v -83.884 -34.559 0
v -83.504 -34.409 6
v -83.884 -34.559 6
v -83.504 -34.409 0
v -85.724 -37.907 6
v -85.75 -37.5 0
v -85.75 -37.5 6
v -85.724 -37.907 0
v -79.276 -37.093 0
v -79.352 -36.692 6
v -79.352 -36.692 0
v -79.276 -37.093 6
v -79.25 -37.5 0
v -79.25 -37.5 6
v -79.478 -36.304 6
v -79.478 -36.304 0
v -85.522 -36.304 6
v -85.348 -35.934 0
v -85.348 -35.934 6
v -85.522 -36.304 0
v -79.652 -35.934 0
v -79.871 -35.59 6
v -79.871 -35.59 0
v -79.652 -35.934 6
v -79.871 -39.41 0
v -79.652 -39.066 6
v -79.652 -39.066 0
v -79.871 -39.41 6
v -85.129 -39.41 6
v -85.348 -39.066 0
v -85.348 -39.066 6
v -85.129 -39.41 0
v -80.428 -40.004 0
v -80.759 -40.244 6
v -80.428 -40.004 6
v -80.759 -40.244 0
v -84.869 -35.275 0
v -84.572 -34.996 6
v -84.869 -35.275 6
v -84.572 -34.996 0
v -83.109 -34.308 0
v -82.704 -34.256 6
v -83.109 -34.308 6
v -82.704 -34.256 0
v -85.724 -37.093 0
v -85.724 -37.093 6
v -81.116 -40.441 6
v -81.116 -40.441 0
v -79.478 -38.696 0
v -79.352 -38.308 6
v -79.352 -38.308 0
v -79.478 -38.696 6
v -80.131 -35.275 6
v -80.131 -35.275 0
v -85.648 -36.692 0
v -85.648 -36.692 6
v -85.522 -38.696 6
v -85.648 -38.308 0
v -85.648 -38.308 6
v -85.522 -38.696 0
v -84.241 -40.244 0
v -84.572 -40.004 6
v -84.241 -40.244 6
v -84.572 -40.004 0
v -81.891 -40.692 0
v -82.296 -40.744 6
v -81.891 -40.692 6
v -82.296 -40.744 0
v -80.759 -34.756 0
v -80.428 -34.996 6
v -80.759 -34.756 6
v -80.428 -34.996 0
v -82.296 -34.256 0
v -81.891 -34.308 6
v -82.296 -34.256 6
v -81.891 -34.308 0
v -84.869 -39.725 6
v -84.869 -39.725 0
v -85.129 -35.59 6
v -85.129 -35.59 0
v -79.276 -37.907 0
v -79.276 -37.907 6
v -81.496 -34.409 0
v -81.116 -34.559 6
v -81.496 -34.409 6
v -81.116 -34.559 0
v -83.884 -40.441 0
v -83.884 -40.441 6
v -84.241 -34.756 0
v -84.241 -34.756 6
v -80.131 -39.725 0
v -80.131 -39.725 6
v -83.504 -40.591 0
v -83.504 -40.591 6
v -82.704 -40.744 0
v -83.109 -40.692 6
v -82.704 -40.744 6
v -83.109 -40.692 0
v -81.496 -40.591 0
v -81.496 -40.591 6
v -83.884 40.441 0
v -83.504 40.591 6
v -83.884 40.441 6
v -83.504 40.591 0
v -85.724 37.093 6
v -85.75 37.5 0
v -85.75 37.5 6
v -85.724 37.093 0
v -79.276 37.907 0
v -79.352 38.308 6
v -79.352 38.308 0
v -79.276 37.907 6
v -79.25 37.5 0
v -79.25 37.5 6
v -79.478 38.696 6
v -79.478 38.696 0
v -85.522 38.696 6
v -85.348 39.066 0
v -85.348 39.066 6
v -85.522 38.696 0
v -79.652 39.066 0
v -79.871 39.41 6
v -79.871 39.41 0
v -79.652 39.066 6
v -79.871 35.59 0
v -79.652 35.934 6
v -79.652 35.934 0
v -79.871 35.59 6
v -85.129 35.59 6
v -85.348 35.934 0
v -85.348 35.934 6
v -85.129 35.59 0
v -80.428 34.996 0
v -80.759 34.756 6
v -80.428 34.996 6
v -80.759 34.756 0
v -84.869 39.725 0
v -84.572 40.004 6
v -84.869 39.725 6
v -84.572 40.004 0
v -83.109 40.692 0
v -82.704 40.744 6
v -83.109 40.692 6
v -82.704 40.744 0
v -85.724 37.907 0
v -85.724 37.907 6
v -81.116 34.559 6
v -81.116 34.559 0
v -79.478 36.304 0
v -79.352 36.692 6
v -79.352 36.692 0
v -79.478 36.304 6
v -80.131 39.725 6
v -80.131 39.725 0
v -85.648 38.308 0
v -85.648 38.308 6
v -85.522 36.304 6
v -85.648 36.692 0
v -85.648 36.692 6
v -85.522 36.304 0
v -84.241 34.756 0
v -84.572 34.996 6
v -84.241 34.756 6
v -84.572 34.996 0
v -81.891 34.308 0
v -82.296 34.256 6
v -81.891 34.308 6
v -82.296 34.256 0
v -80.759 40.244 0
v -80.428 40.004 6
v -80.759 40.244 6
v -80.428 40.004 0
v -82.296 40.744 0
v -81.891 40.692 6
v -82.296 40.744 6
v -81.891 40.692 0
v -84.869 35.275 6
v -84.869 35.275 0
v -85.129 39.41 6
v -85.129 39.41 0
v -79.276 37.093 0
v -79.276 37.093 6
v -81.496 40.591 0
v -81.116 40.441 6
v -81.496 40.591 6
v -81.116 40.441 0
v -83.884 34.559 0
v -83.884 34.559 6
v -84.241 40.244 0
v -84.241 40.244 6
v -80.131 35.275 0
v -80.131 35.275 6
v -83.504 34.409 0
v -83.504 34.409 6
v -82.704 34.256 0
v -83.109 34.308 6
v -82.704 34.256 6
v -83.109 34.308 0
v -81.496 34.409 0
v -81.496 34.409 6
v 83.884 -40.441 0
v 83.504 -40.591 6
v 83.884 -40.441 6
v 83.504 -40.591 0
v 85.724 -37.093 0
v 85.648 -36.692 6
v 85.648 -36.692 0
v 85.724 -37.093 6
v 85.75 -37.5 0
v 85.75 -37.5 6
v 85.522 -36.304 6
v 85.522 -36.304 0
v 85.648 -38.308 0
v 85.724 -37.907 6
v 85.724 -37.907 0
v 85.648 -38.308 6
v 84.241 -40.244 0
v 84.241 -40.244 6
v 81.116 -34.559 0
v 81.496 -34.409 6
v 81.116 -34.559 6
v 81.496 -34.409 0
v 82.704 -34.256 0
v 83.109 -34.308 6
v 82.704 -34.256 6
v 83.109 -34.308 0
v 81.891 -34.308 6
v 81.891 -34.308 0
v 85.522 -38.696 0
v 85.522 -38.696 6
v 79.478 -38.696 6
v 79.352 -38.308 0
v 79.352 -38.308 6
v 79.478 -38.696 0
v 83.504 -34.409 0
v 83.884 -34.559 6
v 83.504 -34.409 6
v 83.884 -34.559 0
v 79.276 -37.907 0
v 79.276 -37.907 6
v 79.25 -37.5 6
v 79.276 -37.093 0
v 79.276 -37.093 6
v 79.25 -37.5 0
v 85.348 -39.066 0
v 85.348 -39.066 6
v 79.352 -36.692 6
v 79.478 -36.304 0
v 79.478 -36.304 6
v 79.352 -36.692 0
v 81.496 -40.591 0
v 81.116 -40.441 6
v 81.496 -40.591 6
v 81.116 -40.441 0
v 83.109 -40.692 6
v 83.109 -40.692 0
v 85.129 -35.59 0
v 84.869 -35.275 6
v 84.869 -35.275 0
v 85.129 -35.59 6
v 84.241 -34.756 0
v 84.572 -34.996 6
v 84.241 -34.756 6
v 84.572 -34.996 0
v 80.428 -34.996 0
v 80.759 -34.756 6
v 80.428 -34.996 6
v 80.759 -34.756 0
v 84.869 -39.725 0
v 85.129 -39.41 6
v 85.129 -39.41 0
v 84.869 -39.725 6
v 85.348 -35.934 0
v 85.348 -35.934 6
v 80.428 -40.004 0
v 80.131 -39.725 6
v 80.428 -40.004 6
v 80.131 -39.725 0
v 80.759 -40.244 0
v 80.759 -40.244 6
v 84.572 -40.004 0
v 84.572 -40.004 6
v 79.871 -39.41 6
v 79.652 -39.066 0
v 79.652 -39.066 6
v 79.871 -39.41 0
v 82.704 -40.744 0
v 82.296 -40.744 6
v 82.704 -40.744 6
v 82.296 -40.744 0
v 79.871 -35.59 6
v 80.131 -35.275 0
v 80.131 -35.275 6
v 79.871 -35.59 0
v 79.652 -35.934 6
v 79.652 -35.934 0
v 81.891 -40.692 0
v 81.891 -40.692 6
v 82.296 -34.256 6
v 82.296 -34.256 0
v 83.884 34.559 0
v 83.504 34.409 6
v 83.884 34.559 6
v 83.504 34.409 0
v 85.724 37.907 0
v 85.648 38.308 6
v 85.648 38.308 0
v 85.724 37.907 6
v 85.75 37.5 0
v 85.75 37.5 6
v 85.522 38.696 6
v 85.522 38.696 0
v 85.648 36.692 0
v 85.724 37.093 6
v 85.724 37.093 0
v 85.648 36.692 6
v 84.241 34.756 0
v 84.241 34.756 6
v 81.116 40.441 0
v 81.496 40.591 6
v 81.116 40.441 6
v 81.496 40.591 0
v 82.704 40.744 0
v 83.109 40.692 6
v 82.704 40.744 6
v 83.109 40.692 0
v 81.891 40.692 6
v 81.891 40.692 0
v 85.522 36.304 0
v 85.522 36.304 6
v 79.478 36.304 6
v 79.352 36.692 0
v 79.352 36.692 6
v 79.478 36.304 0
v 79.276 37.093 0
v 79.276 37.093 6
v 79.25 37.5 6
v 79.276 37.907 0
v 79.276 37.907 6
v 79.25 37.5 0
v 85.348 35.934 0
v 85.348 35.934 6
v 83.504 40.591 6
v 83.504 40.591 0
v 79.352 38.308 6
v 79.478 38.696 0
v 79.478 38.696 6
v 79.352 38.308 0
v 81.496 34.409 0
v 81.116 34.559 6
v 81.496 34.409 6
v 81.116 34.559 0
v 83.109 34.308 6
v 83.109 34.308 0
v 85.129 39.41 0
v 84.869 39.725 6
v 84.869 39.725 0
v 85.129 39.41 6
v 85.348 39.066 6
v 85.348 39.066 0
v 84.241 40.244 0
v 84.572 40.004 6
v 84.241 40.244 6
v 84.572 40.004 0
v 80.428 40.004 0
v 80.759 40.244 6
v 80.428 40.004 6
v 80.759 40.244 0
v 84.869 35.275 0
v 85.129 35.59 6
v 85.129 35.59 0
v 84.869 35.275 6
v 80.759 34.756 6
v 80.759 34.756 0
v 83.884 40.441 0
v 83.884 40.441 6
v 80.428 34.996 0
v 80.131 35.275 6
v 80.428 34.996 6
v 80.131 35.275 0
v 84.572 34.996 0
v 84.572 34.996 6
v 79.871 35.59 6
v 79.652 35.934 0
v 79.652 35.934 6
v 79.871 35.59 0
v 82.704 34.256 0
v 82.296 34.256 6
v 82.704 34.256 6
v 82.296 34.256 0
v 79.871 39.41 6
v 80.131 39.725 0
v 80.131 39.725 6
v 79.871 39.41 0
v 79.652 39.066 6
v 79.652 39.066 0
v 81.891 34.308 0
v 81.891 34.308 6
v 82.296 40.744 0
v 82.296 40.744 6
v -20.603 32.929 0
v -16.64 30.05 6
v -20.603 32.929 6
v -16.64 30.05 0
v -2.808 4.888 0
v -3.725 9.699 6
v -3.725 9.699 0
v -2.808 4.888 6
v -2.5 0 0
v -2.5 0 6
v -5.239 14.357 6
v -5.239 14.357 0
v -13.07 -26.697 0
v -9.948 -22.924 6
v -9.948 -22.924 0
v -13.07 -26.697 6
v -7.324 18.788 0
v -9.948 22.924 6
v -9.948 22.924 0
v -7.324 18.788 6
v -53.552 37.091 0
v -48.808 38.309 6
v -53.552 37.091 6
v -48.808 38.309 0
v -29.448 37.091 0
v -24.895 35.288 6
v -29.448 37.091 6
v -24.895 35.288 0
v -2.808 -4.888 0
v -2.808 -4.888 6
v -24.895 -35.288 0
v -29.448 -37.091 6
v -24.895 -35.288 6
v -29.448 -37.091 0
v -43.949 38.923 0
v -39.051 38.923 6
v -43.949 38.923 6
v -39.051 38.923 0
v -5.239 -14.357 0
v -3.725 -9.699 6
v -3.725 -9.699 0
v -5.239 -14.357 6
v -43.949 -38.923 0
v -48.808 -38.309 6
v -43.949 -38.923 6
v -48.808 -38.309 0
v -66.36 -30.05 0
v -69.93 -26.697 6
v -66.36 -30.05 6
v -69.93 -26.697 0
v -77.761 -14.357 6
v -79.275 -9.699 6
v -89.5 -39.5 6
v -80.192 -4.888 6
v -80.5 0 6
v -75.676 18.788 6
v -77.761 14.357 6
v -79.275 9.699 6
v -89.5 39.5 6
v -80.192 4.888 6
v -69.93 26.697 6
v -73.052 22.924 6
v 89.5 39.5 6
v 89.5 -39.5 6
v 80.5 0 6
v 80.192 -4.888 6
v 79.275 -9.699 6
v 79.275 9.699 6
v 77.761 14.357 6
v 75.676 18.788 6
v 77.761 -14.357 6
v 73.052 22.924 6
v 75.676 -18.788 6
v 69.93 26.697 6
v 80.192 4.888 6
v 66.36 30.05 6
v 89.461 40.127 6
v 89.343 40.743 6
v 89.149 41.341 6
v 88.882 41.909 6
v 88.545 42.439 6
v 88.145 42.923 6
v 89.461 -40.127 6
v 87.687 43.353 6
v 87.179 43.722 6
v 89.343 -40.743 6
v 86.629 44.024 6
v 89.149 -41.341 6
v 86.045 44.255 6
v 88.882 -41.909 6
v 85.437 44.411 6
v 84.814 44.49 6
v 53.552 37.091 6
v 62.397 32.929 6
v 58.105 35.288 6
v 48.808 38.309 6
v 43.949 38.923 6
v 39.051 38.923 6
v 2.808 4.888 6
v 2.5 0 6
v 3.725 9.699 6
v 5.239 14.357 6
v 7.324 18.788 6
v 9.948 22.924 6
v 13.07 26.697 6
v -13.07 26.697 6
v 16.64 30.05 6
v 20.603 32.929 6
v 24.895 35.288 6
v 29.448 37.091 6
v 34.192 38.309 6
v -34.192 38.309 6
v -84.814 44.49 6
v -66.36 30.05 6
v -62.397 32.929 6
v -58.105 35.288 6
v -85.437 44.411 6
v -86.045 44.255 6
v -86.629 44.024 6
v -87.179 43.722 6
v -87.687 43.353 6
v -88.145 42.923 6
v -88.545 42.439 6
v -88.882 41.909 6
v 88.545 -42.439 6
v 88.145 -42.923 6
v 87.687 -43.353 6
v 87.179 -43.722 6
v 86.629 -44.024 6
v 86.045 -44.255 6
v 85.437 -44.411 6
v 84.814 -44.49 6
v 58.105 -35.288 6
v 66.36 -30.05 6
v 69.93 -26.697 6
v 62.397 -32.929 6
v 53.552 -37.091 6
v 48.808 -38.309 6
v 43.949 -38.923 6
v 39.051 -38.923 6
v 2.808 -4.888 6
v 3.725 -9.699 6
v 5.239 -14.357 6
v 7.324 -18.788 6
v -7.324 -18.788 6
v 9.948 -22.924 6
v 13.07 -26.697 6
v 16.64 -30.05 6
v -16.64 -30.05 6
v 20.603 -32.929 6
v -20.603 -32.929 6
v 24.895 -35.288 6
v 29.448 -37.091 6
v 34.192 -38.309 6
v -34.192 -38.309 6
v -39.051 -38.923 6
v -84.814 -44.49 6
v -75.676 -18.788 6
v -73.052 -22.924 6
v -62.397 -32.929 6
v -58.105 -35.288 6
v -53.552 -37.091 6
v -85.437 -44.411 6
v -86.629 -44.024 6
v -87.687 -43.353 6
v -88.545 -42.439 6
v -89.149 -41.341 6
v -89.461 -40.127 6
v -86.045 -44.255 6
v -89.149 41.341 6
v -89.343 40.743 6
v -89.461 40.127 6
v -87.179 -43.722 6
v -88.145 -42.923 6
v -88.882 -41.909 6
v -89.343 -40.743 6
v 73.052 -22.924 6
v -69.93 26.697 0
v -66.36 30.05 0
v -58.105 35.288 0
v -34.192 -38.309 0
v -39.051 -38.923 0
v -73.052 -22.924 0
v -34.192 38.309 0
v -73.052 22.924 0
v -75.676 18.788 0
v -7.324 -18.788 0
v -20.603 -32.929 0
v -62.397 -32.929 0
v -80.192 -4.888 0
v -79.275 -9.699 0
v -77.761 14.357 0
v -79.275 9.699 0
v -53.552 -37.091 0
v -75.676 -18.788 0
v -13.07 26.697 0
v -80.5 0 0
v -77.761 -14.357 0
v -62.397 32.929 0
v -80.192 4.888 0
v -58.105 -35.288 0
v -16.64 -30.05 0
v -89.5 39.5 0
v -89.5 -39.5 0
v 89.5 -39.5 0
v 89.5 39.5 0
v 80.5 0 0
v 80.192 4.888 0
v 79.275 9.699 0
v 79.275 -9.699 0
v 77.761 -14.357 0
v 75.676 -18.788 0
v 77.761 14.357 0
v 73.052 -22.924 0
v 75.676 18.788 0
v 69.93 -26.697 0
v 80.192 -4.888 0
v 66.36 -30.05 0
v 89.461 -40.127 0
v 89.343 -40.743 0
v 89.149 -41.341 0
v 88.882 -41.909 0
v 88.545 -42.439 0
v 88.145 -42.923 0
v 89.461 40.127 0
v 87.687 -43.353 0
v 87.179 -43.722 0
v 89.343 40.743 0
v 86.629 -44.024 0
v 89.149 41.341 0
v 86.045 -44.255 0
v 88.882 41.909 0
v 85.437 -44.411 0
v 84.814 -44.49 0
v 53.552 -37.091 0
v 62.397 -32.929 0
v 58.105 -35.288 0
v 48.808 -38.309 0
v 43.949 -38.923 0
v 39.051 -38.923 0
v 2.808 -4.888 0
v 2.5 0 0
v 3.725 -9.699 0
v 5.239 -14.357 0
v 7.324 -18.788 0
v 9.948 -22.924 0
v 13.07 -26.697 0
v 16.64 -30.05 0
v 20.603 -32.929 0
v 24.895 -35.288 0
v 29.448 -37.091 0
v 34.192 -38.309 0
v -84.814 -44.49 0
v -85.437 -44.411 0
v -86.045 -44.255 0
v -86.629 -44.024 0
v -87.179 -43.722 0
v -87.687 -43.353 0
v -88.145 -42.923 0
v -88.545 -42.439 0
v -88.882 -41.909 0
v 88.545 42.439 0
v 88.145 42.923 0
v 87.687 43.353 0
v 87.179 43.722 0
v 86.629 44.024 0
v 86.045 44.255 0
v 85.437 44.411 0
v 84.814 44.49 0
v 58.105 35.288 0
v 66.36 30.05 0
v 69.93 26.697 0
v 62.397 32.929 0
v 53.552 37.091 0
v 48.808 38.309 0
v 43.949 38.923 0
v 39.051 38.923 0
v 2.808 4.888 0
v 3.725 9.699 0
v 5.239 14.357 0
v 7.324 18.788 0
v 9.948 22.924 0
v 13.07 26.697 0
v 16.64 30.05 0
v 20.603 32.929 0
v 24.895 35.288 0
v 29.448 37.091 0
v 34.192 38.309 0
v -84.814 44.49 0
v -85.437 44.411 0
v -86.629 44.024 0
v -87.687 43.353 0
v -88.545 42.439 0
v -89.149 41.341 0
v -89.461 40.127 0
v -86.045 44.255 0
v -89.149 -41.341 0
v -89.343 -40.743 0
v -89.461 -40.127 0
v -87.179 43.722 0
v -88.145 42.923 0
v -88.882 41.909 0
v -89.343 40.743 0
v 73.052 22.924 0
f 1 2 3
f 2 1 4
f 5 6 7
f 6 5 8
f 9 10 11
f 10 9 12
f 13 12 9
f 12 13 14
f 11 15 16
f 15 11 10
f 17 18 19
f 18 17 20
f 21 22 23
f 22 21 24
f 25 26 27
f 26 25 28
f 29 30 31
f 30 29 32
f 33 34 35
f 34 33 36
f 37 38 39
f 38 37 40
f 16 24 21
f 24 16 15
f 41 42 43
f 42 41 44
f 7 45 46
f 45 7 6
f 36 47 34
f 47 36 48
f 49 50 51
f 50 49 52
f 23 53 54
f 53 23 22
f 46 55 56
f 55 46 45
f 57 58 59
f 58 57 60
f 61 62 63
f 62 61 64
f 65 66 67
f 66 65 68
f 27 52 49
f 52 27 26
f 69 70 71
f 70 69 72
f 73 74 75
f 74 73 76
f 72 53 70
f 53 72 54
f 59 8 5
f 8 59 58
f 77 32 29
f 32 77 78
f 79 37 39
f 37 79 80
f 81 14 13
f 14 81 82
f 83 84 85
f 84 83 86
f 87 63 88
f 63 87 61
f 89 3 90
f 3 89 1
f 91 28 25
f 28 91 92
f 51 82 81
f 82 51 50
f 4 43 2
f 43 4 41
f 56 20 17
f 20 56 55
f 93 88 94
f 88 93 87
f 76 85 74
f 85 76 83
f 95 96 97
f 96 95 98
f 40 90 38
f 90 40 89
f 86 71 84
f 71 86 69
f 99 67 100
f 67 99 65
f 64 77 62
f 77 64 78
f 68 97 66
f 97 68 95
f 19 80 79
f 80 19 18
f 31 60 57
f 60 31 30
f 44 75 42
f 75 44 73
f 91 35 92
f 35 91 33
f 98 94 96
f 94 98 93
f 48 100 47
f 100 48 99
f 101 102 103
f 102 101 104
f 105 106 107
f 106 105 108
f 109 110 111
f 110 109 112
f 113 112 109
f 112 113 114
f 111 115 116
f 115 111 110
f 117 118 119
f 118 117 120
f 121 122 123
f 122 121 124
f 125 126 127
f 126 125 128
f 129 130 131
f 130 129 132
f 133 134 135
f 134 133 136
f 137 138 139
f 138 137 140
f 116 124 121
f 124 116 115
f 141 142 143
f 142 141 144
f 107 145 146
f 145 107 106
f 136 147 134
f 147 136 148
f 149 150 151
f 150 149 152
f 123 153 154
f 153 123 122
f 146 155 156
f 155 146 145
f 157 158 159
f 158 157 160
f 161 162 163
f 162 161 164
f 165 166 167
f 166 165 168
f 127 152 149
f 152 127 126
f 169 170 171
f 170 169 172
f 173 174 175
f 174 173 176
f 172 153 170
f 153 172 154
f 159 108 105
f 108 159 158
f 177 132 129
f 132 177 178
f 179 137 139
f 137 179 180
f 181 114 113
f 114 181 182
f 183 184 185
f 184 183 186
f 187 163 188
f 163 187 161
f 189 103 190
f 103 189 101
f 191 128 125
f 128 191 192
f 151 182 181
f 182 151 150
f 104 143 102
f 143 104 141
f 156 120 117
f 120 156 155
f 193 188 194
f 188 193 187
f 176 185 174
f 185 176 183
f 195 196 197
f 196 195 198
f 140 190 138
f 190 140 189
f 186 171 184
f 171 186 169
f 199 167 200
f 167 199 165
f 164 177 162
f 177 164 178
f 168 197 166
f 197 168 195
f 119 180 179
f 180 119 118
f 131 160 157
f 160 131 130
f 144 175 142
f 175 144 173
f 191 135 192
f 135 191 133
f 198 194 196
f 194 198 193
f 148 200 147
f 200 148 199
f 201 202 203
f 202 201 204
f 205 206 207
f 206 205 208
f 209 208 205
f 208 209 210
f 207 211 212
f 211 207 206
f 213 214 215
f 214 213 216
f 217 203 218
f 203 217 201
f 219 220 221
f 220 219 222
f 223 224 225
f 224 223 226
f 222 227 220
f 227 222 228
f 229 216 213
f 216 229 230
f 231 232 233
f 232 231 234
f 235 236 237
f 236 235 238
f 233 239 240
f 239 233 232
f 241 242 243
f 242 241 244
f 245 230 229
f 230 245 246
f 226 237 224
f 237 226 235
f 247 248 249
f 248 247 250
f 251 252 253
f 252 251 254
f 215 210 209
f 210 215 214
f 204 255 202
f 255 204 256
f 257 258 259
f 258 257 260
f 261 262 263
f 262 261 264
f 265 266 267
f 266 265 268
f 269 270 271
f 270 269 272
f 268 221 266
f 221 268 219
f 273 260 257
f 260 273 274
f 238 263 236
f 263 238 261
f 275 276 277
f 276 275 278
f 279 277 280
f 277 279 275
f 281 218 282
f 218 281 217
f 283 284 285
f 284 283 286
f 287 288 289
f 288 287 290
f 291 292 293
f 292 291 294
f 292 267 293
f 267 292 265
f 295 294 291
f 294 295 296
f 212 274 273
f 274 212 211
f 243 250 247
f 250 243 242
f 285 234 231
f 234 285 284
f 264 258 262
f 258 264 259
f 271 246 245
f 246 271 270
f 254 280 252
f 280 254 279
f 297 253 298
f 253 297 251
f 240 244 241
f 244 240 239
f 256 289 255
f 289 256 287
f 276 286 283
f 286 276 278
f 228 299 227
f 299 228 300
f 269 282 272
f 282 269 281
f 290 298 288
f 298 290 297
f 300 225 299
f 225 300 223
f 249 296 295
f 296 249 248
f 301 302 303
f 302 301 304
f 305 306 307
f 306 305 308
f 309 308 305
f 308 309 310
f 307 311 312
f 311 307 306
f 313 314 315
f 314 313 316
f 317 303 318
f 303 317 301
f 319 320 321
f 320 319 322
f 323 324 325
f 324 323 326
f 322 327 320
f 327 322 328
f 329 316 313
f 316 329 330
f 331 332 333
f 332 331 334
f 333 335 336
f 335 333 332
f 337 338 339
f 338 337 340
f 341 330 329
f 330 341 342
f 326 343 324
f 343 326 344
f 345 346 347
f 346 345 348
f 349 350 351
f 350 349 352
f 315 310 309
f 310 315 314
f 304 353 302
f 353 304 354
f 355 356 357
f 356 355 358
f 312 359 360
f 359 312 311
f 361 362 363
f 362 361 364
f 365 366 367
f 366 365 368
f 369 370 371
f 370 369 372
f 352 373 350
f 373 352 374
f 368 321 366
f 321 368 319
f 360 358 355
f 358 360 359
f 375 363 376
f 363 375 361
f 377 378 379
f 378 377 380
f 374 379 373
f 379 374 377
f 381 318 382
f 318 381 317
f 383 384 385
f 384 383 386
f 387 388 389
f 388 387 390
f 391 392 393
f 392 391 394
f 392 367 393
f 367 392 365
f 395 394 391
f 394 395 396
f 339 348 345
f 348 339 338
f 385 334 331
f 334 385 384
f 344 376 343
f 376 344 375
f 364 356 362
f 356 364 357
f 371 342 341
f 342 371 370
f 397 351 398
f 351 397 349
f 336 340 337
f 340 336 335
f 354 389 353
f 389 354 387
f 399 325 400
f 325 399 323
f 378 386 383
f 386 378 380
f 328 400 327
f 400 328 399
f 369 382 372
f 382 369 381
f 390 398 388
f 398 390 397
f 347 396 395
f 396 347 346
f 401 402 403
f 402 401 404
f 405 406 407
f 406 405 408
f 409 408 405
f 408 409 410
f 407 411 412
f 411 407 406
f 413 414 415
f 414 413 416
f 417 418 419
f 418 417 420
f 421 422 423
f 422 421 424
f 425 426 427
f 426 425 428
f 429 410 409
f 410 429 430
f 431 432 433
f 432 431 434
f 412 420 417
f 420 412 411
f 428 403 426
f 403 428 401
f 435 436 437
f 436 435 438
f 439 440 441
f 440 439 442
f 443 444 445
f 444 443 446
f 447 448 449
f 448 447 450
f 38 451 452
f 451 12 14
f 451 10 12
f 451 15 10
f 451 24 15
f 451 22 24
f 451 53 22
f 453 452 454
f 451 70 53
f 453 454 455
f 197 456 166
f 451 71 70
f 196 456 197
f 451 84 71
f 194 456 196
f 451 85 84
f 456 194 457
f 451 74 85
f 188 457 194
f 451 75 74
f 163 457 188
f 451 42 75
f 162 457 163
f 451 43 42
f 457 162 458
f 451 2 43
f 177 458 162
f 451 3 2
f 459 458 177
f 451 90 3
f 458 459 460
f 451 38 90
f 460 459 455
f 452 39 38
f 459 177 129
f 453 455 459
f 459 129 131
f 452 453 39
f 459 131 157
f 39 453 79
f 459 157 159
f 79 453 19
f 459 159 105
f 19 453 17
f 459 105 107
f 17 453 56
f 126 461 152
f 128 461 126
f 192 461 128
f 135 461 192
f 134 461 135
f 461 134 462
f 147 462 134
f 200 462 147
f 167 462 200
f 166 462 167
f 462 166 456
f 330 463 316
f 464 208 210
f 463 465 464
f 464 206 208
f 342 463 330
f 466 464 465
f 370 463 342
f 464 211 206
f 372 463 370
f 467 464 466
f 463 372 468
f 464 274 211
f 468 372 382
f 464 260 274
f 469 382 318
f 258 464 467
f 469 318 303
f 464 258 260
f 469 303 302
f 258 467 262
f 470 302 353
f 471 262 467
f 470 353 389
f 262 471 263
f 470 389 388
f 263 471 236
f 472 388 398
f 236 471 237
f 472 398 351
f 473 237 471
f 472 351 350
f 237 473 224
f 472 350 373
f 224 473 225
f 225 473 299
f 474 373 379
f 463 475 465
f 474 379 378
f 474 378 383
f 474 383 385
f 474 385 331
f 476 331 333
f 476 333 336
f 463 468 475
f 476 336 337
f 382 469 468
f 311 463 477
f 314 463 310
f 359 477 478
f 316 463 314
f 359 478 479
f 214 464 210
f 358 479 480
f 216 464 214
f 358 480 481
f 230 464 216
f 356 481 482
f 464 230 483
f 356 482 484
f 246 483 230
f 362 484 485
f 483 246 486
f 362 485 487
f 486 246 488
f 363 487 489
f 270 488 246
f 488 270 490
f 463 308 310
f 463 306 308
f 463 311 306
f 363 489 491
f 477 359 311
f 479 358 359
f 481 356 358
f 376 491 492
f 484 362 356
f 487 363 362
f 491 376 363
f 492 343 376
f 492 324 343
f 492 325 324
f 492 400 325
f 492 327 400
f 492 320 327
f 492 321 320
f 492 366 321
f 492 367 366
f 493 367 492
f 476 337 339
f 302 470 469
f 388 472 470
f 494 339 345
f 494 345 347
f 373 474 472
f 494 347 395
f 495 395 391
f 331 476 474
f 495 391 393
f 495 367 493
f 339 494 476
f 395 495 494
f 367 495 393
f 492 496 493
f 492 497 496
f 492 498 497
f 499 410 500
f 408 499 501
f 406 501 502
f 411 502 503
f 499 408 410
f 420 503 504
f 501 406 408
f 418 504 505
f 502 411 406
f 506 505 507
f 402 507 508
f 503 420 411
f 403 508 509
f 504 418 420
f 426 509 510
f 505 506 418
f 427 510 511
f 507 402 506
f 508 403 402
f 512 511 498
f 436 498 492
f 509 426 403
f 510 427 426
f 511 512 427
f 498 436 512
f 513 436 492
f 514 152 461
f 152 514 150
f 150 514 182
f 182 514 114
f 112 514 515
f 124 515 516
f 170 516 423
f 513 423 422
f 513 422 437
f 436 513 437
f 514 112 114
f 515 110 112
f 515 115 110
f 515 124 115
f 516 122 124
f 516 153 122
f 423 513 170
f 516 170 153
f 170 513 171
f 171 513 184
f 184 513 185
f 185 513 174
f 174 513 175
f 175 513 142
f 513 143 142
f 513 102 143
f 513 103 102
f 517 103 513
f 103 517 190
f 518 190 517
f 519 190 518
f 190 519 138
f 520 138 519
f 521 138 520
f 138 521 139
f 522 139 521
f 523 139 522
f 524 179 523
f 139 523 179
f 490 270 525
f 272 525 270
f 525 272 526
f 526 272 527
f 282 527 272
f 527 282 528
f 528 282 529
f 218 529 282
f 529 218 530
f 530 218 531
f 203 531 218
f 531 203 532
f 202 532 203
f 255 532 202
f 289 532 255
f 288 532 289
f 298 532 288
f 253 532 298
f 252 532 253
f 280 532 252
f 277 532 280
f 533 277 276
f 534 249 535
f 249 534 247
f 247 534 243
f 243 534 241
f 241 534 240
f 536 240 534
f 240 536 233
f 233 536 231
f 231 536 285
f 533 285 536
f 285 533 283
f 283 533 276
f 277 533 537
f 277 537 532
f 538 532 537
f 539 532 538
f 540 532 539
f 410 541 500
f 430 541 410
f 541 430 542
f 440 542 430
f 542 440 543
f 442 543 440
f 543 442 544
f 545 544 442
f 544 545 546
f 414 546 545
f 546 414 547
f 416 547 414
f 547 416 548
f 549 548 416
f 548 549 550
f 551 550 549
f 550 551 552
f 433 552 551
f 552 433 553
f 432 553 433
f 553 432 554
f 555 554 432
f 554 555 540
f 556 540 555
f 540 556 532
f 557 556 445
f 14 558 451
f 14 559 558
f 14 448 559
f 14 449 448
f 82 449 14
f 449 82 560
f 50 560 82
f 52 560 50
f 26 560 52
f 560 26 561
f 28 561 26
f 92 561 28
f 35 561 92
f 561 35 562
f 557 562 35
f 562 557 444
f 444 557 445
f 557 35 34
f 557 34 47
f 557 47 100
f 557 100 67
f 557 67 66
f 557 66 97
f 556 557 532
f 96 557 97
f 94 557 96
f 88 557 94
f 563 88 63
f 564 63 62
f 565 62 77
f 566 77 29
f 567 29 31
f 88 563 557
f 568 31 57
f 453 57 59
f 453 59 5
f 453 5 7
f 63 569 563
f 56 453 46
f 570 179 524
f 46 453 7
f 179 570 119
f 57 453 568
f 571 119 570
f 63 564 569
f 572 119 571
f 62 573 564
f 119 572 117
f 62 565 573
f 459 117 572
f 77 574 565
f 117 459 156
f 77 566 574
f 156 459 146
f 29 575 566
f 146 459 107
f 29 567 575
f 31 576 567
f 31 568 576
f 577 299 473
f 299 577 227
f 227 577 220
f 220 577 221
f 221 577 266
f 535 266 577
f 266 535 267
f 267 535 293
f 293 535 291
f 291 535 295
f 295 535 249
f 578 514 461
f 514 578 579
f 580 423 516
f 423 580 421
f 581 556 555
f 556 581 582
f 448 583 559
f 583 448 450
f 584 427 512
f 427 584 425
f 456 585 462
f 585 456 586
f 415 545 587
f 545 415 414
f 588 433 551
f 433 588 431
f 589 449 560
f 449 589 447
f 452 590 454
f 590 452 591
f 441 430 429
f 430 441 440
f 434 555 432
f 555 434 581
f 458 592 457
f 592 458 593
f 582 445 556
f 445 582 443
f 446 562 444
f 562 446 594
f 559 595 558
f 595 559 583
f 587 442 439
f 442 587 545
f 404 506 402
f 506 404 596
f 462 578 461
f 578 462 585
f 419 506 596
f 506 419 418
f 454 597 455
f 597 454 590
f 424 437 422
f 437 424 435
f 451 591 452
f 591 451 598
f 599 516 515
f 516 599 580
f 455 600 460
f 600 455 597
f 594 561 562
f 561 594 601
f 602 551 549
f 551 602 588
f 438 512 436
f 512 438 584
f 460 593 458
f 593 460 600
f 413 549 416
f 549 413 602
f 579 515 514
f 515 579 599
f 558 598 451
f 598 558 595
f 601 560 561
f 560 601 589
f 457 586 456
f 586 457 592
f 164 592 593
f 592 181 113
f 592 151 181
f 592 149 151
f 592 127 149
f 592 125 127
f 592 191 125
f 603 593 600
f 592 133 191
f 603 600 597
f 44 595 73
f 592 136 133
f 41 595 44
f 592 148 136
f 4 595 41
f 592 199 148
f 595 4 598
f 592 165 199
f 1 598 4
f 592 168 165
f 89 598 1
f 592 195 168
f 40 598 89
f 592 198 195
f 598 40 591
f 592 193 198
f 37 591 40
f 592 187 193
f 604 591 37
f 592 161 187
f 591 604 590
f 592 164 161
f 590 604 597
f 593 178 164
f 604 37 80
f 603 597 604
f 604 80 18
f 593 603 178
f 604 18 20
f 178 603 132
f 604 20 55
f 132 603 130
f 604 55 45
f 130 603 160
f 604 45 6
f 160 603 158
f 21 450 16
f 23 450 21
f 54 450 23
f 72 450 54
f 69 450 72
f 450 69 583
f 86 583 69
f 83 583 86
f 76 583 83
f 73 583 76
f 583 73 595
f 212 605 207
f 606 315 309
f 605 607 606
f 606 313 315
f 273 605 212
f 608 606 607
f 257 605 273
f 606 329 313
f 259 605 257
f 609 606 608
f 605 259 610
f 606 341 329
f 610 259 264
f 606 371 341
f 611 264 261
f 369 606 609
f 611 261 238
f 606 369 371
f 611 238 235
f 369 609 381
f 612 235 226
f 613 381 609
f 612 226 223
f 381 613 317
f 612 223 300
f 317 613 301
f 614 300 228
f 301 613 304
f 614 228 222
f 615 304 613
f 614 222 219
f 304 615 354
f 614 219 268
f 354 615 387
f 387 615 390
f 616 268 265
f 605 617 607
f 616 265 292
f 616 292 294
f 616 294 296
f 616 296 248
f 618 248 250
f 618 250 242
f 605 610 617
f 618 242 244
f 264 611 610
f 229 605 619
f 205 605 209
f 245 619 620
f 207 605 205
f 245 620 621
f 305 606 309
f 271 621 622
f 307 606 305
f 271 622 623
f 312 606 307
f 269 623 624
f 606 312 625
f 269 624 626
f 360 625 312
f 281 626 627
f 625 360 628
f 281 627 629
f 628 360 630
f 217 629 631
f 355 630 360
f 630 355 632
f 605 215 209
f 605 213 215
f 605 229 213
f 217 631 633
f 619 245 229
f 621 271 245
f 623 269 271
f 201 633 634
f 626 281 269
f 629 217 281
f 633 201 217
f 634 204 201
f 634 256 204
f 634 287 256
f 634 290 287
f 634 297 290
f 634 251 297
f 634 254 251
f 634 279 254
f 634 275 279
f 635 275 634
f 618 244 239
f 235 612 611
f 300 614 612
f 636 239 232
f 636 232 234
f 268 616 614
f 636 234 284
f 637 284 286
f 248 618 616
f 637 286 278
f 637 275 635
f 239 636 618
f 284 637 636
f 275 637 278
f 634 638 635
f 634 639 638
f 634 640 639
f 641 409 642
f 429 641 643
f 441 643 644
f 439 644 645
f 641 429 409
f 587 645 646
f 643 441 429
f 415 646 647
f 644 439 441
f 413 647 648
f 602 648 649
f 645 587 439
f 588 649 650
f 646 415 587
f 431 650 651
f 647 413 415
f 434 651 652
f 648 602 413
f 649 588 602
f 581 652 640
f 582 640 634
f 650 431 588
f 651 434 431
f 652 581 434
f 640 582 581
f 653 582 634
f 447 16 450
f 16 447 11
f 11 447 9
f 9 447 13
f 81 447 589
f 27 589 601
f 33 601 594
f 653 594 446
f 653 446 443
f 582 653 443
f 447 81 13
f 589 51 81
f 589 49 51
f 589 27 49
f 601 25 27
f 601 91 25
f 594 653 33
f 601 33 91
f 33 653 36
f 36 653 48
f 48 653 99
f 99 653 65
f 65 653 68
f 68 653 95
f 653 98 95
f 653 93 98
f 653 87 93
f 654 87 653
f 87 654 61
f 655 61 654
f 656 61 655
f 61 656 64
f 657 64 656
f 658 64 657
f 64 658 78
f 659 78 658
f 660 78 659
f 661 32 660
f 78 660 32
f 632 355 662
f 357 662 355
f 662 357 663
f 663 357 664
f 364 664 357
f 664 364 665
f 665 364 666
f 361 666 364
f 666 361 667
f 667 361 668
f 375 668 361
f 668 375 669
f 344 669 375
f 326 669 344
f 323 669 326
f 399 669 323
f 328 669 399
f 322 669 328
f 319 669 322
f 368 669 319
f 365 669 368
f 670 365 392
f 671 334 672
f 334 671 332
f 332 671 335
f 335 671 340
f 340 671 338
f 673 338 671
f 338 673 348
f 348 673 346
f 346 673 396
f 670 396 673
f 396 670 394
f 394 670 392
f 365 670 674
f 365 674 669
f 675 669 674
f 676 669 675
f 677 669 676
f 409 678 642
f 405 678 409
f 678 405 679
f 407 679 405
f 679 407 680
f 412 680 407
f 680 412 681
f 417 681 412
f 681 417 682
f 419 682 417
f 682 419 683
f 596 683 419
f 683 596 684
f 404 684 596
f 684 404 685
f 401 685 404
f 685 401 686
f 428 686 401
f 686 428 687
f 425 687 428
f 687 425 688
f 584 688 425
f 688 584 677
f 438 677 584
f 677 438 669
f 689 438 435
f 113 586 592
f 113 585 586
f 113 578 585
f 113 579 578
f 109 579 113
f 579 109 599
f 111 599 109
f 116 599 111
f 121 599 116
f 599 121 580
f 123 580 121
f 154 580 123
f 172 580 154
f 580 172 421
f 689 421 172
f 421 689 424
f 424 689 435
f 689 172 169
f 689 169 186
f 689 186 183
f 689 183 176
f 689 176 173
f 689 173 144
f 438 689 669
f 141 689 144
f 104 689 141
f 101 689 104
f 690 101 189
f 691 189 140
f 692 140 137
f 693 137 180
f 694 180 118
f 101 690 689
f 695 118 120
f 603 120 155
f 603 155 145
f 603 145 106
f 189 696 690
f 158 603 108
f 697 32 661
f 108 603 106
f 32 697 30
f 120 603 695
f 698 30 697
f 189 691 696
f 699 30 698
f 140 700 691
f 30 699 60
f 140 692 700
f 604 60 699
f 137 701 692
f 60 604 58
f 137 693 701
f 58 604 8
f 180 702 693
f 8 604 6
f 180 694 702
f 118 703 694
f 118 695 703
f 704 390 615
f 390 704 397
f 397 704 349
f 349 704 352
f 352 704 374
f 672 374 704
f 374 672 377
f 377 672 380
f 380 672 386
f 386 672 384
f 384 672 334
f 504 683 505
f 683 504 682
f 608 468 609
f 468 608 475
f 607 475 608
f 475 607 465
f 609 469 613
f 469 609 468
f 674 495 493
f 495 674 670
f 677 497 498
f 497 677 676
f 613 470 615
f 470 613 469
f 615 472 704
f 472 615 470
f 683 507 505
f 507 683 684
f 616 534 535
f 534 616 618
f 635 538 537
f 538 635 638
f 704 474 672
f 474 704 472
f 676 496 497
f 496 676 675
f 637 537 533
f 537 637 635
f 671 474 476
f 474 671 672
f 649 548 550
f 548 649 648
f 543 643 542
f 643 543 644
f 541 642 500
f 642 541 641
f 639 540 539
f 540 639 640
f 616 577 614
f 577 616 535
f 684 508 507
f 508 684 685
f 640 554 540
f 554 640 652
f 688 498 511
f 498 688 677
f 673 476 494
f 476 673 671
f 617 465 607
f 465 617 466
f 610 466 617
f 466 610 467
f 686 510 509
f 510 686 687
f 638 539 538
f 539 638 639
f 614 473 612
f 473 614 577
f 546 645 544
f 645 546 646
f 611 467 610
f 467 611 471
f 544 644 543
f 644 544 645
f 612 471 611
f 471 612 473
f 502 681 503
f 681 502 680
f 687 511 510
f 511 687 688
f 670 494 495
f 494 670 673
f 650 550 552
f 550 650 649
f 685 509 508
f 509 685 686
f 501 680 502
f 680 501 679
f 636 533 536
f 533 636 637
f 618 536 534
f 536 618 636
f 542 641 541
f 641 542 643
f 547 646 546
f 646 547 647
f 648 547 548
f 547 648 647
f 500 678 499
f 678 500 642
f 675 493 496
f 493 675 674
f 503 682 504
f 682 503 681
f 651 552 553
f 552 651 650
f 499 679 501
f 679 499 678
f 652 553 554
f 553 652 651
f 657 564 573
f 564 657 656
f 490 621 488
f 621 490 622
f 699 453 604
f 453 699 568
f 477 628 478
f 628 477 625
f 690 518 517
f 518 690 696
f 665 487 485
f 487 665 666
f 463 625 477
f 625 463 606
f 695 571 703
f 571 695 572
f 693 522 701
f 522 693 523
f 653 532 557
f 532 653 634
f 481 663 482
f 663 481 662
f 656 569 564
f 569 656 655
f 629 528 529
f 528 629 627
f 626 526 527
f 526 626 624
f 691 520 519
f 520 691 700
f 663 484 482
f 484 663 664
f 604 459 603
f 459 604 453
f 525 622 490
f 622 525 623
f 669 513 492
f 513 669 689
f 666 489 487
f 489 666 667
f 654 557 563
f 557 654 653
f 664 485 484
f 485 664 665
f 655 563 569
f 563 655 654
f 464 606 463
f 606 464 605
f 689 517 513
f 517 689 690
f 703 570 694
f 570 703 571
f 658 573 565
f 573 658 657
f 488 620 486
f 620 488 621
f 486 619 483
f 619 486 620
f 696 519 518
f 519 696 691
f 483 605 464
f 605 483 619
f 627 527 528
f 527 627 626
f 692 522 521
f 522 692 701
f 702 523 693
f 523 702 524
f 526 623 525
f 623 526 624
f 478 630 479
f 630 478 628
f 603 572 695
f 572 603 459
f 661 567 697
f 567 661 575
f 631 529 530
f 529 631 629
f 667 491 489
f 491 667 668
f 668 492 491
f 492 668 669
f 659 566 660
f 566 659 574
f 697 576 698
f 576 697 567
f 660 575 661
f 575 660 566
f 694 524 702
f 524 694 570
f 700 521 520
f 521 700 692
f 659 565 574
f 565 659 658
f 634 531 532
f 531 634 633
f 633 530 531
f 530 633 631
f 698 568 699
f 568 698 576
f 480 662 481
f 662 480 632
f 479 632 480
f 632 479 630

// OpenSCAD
$fn = 50;

difference() {
	union() {
		hull() {
			translate(v = [-84.5, 39.5, 0]) {
				cylinder(h = 6, r = 5);
			}
			translate(v = [84.5, 39.5, 0]) {
				cylinder(h = 6, r = 5);
			}
			translate(v = [-84.5, -39.5, 0]) {
				cylinder(h = 6, r = 5);
			}
			translate(v = [84.5, -39.5, 0]) {
				cylinder(h = 6, r = 5);
			}
		}
	}
	union() {
		translate(v = [-82.5, -37.5, -100.0]) {
			cylinder(h = 200, r = 3.25);
		}
		translate(v = [-82.5, 37.5, -100.0]) {
			cylinder(h = 200, r = 3.25);
		}
		translate(v = [82.5, -37.5, -100.0]) {
			cylinder(h = 200, r = 3.25);
		}
		translate(v = [82.5, 37.5, -100.0]) {
			cylinder(h = 200, r = 3.25);
		}
		translate(v = [-82.5, -37.5, -100.0]) {
			cylinder(h = 200, r = 1.8);
		}
		translate(v = [-82.5, 37.5, -100.0]) {
			cylinder(h = 200, r = 1.8);
		}
		translate(v = [82.5, -37.5, -100.0]) {
			cylinder(h = 200, r = 1.8);
		}
		translate(v = [82.5, 37.5, -100.0]) {
			cylinder(h = 200, r = 1.8);
		}
		translate(v = [-41.5, 0, 0.0]) {
			cylinder(h = 6, r = 39.0);
		}
		translate(v = [41.5, 0, 0.0]) {
			cylinder(h = 6, r = 39.0);
		}
	}
}
